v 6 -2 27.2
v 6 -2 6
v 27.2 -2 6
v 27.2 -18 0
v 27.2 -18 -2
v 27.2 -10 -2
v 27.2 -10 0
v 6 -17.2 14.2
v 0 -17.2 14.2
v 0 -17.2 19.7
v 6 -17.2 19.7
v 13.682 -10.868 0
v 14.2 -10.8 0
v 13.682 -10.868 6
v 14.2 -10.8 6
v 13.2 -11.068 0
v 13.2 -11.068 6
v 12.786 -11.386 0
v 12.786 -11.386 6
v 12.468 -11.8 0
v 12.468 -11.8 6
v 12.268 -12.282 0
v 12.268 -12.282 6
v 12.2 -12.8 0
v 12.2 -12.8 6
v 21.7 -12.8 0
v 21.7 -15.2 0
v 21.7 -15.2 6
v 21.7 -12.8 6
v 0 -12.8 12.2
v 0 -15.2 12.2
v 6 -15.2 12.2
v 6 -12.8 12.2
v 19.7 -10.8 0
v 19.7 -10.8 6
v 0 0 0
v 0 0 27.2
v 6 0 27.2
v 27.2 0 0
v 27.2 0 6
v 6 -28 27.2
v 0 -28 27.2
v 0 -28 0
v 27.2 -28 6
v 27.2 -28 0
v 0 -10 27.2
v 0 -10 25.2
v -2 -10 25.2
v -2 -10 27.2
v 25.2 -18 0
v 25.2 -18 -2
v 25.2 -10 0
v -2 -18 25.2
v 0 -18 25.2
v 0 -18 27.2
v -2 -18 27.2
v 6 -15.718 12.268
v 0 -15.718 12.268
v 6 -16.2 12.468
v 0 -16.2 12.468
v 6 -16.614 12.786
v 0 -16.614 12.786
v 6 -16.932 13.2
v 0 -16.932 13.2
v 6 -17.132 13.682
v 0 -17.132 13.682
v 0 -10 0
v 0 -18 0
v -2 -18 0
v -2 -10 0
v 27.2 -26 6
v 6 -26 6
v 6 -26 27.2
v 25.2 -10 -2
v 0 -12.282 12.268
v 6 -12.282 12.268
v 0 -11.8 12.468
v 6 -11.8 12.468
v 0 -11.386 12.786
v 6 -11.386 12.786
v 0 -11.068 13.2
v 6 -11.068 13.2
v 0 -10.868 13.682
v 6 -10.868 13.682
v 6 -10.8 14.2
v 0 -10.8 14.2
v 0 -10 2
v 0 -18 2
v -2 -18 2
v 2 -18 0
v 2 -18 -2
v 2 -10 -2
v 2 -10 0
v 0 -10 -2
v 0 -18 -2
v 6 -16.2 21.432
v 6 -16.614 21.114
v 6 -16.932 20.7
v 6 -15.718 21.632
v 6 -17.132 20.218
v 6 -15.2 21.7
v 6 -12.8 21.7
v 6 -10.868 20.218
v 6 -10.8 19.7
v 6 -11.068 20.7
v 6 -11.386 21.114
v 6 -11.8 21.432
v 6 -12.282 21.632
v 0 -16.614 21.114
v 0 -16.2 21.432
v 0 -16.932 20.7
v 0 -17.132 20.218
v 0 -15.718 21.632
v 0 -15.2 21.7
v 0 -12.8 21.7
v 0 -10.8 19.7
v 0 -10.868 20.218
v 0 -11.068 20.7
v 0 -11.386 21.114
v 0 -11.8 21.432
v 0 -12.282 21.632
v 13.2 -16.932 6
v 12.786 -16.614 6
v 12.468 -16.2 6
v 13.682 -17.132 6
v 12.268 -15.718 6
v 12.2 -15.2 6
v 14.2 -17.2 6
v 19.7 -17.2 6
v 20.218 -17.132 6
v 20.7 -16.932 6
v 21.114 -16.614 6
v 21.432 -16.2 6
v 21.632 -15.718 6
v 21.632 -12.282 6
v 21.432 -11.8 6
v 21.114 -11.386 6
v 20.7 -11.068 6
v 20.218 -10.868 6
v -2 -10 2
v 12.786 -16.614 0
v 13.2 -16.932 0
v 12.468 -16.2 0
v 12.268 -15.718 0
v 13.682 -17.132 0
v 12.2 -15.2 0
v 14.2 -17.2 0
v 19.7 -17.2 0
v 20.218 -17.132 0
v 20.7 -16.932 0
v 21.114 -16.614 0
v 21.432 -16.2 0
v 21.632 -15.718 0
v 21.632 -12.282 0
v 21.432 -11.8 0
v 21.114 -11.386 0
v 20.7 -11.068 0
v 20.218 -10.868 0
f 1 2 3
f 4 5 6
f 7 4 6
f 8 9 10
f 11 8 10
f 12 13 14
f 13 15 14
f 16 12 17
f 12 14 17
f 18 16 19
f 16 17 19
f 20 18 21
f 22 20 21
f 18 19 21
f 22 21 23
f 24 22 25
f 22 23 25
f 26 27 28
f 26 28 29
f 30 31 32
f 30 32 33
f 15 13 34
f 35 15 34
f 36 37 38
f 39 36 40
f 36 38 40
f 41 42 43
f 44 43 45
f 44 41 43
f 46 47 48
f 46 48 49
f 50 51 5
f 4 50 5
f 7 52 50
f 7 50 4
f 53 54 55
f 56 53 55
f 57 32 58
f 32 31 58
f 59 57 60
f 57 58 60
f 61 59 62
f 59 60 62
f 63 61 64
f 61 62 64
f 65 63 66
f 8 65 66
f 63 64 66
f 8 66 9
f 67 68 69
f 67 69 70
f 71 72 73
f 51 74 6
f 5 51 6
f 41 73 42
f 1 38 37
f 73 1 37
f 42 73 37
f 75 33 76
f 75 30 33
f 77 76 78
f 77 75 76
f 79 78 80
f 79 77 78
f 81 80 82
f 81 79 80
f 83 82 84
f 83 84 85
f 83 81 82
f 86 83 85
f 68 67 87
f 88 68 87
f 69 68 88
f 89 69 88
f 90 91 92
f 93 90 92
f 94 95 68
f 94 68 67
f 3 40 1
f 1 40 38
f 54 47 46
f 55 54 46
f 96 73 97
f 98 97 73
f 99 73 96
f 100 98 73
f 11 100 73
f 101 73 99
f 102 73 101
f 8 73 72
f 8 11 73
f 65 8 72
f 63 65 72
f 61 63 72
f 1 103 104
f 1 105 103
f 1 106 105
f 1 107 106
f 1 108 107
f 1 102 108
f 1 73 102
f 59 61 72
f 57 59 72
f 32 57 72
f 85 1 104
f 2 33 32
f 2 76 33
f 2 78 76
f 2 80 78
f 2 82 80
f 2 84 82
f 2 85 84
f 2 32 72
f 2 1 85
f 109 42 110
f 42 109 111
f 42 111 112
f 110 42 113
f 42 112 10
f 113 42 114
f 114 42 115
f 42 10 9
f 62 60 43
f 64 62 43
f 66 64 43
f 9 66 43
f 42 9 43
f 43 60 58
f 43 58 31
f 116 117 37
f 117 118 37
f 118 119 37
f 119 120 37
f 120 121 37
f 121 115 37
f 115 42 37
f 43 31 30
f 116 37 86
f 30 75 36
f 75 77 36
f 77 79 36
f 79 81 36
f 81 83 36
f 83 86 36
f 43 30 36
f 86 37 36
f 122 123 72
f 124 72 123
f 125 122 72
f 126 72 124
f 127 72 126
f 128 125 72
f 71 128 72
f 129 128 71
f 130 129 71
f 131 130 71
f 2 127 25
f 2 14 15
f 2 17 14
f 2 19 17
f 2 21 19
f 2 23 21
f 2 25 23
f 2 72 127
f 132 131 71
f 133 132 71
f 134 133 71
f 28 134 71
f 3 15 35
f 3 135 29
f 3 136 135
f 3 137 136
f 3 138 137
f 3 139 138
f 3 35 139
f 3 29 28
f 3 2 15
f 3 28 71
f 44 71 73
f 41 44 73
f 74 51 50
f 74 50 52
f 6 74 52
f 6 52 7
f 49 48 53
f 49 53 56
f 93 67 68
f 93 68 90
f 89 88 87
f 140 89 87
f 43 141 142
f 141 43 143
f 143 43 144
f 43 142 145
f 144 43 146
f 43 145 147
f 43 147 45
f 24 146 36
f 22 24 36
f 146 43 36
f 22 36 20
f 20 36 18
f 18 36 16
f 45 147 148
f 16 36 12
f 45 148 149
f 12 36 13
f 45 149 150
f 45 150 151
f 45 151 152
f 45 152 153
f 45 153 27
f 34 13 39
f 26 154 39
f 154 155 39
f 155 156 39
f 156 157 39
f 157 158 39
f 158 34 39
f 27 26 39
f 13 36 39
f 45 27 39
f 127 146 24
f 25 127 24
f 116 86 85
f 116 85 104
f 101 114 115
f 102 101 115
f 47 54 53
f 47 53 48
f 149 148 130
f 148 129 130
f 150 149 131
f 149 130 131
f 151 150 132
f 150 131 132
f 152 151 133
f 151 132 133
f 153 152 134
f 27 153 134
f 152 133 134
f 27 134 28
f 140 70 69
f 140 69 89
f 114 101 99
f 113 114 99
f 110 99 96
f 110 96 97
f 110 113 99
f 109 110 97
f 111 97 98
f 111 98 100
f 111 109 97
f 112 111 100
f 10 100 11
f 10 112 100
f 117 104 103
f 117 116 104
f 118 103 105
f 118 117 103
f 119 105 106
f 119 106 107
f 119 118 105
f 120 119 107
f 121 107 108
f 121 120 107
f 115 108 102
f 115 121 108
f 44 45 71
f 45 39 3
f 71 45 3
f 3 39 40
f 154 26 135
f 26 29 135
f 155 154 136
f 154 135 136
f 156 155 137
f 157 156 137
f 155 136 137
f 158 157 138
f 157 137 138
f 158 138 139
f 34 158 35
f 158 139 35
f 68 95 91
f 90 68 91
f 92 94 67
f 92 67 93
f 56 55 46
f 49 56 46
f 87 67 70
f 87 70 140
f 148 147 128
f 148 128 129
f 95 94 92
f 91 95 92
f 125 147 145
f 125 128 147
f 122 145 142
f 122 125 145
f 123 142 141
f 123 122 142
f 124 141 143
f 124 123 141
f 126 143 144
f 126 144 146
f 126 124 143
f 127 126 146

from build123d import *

# Parameters (mm, degrees)
BOX002_W                  = 2
BOX002_H                  = 8
BOX002_DEPTH              = 2
BOX003_W                  = 2
BOX003_H                  = 8
BOX003_DEPTH              = 2
BOX004_W                  = 2
BOX004_H                  = 8
BOX004_DEPTH              = 2
BOX005_W                  = 2
BOX005_H                  = 8
BOX005_DEPTH              = 2
FUSION002_PLACEMENT_ANGLE = 270
BOX_W                     = 9.5
BOX_H                     = 6.4
BOX_DEPTH                 = 6
BOX001_W                  = 9.5
BOX001_H                  = 6.4
BOX001_DEPTH              = 6
COMPOUND_PLACEMENT_ANGLE  = 270
PAD001_DEPTH              = 24
PAD_DEPTH                 = 28
FILLET_R                  = 2


with BuildPart() as cube002:
    # Box002 → Box002 (new body)
    with BuildSketch(Plane(origin=(0, -18, -2), x_dir=(1, 0, 0), z_dir=(0, 0, 1))):
        with Locations((1, 4)):
            Rectangle(BOX002_W, BOX002_H)
    extrude(amount=BOX002_DEPTH)


with BuildPart() as fusion001:
    # Box003 → Box003 (new body)
    with BuildSketch(Plane(origin=(25.2, -18, -2), x_dir=(1, 0, 0), z_dir=(0, 0, 1))):
        with Locations((1, 4)):
            Rectangle(BOX003_W, BOX003_H)
    extrude(amount=BOX003_DEPTH)

    # Fusion001: union Cube002
    add(cube002.part)


with BuildPart() as cube004:
    # Box004 → Box004 (new body)
    with BuildSketch(Plane(origin=(0, -18, -2), x_dir=(1, 0, 0), z_dir=(0, 0, 1))):
        with Locations((1, 4)):
            Rectangle(BOX004_W, BOX004_H)
    extrude(amount=BOX004_DEPTH)


with BuildPart() as slotguide:
    # Box005 → Box005 (new body)
    with BuildSketch(Plane(origin=(25.2, -18, -2), x_dir=(1, 0, 0), z_dir=(0, 0, 1))):
        with Locations((1, 4)):
            Rectangle(BOX005_W, BOX005_H)
    extrude(amount=BOX005_DEPTH)

    # Fusion002: union Cube004
    add(cube004.part)


with BuildPart() as slotguide_1:
    # Fusion002 placement: moved
    add(slotguide.part.moved(Location((-2, 0, 0))).rotate(Axis((-2, 0, 0), (0, 1, 0)), FUSION002_PLACEMENT_ANGLE))

    # Fusion003: union Fusion001
    add(fusion001.part)


with BuildPart() as cube:
    # Box → Box (new body)
    with BuildSketch(Plane(origin=(12.2, -17.2, 0), x_dir=(1, 0, 0), z_dir=(0, 0, 1))):
        with Locations((4.75, 3.2)):
            Rectangle(BOX_W, BOX_H)
    extrude(amount=BOX_DEPTH)


with BuildPart() as fusion:
    # Box001 → Box001 (new body)
    with BuildSketch(Plane(origin=(12.2, -17.2, 0), x_dir=(1, 0, 0), z_dir=(0, 0, 1))):
        with Locations((4.75, 3.2)):
            Rectangle(BOX001_W, BOX001_H)
    extrude(amount=BOX001_DEPTH)


with BuildPart() as fusion_1:
    # Compound placement: moved
    add(fusion.part.moved(Location((6, 0, 0))).rotate(Axis((6, 0, 0), (0, 1, 0)), COMPOUND_PLACEMENT_ANGLE))

    # Fusion: union Cube
    add(cube.part)


with BuildPart() as body001:
    # Sketch001 → Pad001 (new body)
    with BuildSketch(Plane.XZ):
        Polygon((6, 6), (27.2, 6), (6, 27.2), align=None)
    extrude(amount=PAD001_DEPTH)


with BuildPart() as body001_1:
    # Body001 placement: moved
    add(body001.part.moved(Location((0, -2, 0))))


with BuildPart() as filletedbasebracket:
    # Sketch → Pad (new body)
    with BuildSketch(Plane.XZ):
        Polygon((0, 0), (27.2, 0), (27.2, 6), (6, 27.2), (0, 27.2), align=None)
    extrude(amount=PAD_DEPTH)

    # Cut: cut Body001
    add(body001_1.part, mode=Mode.SUBTRACT)

    # Cut001: cut Fusion
    add(fusion_1.part, mode=Mode.SUBTRACT)

    # Fillet
    fillet_edges = [filletedbasebracket.edges().sort_by_distance(p)[0] for p in [
        (12.2, -17.2, 3),
        (12.2, -10.8, 3),
        (21.7, -17.2, 3),
        (21.7, -10.8, 3),
        (3, -10.8, 21.7),
        (3, -10.8, 12.2),
        (3, -17.2, 21.7),
        (3, -17.2, 12.2),
    ]]
    fillet(fillet_edges, radius=FILLET_R)


solid = Compound([slotguide_1.part, filletedbasebracket.part])
